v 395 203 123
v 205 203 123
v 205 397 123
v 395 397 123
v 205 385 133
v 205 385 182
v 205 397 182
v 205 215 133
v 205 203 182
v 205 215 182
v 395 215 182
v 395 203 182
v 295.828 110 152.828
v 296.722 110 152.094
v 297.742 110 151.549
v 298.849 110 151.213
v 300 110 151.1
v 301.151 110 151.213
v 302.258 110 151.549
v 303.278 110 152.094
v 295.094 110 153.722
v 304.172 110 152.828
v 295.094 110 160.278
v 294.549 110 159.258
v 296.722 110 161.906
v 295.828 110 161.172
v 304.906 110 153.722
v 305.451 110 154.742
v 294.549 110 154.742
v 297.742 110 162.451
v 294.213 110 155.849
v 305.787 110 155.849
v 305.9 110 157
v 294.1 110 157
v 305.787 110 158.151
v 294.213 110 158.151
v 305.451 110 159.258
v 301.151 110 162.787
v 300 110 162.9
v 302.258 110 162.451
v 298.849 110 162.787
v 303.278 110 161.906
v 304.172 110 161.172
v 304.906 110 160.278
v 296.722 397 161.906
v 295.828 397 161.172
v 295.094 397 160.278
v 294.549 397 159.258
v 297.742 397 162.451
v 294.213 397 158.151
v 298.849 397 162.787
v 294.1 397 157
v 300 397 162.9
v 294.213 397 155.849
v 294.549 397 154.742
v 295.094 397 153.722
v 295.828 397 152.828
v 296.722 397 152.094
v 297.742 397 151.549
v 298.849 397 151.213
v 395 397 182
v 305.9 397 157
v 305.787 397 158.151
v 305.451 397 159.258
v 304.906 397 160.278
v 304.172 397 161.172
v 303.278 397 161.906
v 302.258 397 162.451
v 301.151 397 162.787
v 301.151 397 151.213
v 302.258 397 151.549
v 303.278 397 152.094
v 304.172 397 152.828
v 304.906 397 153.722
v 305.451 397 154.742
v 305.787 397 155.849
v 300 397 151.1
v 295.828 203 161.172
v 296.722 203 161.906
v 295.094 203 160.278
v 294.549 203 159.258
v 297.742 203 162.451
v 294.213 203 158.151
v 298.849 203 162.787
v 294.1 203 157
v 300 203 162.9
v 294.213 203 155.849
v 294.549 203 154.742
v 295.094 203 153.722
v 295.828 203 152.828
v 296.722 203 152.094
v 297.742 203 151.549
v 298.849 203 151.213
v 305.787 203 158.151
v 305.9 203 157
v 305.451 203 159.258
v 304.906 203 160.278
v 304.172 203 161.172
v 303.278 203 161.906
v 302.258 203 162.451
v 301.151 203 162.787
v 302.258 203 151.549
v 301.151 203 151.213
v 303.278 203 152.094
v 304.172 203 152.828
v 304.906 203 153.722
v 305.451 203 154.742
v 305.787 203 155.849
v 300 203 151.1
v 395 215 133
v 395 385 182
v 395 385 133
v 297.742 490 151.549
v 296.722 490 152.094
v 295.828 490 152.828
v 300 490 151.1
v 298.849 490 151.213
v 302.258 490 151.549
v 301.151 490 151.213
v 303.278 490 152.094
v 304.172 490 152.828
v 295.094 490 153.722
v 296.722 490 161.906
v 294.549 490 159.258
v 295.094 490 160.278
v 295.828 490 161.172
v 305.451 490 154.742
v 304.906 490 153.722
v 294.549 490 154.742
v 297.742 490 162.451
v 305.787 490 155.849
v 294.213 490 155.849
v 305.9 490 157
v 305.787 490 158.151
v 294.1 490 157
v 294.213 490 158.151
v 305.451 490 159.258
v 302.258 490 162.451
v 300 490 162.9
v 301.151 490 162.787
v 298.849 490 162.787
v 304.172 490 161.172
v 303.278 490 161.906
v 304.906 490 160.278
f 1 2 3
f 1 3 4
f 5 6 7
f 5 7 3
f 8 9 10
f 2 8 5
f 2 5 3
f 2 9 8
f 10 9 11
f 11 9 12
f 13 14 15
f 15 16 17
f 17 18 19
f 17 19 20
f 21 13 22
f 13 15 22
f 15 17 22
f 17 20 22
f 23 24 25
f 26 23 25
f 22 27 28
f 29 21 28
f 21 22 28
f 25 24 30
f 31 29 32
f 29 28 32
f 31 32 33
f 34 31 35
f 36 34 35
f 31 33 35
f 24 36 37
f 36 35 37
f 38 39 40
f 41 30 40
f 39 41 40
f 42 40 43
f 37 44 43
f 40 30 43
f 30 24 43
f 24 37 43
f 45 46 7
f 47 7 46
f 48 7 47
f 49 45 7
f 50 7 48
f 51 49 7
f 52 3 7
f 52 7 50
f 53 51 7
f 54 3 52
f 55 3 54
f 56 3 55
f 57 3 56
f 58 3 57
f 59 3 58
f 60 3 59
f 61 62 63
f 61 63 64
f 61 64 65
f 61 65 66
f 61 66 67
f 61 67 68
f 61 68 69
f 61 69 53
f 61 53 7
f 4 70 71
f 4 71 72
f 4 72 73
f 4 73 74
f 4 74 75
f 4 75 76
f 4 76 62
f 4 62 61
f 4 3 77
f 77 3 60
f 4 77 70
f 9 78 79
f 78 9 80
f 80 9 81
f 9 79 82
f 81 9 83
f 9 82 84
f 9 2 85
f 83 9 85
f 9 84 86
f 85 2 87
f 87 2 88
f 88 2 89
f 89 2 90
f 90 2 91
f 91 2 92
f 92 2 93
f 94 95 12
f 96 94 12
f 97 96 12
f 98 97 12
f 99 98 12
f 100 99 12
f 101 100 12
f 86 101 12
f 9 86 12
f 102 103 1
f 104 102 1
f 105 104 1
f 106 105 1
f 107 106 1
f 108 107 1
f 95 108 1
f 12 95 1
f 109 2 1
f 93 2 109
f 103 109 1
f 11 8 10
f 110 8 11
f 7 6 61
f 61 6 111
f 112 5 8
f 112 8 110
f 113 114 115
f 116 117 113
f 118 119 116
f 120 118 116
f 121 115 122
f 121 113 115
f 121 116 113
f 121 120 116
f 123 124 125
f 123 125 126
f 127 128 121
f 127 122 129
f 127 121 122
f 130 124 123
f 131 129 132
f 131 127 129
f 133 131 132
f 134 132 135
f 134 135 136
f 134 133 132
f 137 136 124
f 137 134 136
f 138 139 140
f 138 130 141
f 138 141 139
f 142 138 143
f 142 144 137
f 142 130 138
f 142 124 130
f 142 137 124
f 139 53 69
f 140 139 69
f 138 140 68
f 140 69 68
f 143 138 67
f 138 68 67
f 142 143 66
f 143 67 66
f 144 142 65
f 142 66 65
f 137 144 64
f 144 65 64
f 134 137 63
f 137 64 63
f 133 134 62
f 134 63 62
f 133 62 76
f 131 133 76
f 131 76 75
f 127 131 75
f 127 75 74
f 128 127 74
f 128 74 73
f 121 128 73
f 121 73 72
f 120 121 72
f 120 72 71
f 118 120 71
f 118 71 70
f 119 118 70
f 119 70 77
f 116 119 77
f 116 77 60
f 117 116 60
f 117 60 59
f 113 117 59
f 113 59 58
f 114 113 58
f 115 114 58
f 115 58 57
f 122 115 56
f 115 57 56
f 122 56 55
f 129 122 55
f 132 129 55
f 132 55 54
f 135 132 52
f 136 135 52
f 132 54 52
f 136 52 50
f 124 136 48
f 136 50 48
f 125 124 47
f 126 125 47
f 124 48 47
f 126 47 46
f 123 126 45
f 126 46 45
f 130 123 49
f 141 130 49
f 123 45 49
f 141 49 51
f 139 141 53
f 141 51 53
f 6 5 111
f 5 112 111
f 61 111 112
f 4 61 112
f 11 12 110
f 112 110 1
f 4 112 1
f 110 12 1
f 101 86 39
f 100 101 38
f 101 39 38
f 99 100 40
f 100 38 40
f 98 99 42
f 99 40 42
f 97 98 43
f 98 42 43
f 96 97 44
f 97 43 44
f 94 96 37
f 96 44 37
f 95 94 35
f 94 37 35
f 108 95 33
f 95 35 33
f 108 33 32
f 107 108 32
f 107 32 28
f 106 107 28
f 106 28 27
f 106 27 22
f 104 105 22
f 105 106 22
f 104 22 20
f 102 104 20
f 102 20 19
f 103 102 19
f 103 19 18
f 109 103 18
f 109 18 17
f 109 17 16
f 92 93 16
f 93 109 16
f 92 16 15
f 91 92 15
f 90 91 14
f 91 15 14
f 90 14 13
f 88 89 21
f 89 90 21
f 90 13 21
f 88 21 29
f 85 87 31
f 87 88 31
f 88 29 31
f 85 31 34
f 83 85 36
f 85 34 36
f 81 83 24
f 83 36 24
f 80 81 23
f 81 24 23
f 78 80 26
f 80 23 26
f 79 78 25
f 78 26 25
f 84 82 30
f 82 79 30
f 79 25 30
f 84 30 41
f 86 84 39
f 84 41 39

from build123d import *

# Parameters (mm, degrees)
SKETCH1_W           = 190
SKETCH1_H           = 170
BOSS_EXTRUDE1_DEPTH = 10
SKETCH2_W           = 190
SKETCH2_H           = 59
BOSS_EXTRUDE2_DEPTH = 12
SKETCH3_W           = 190
SKETCH3_H           = 59
BOSS_EXTRUDE3_DEPTH = 12
SKETCH4_R           = 5.9
BOSS_EXTRUDE4_DEPTH = 105
SKETCH5_R           = 5.9
BOSS_EXTRUDE5_DEPTH = 105


with BuildPart() as part:
    # Sketch1 → Boss-Extrude1 (new body)
    with BuildSketch(Plane.XY.offset(123)):
        with Locations((300, 300)):
            Rectangle(SKETCH1_W, SKETCH1_H)
    extrude(amount=BOSS_EXTRUDE1_DEPTH)

    # Sketch2 → Boss-Extrude2 (add)
    with BuildSketch(Plane(origin=(0, 385, 0), x_dir=(1, 0, 0), z_dir=(0, 1, 0))):
        with Locations((300, -152.5)):
            Rectangle(SKETCH2_W, SKETCH2_H)
    extrude(amount=BOSS_EXTRUDE2_DEPTH)

    # Sketch3 → Boss-Extrude3 (add)
    with BuildSketch(Plane(origin=(0, 203, 0), x_dir=(1, 0, 0), z_dir=(0, 1, 0))):
        with Locations((300, -152.5)):
            Rectangle(SKETCH3_W, SKETCH3_H)
    extrude(amount=BOSS_EXTRUDE3_DEPTH)

    # Sketch4 → Boss-Extrude4 (add)
    with BuildSketch(Plane(origin=(0, 385, 0), x_dir=(1, 0, 0), z_dir=(0, 1, 0))):
        with Locations(Location((300, -157, 0), (0, 0, 270))):
            Circle(SKETCH4_R)
    extrude(amount=BOSS_EXTRUDE4_DEPTH)

    # Sketch5 → Boss-Extrude5 (add)
    with BuildSketch(Plane(origin=(0, 110, 0), x_dir=(1, 0, 0), z_dir=(0, 1, 0))):
        with Locations(Location((300, -157, 0), (0, 0, 270))):
            Circle(SKETCH5_R)
    extrude(amount=BOSS_EXTRUDE5_DEPTH)


solid = part.part
